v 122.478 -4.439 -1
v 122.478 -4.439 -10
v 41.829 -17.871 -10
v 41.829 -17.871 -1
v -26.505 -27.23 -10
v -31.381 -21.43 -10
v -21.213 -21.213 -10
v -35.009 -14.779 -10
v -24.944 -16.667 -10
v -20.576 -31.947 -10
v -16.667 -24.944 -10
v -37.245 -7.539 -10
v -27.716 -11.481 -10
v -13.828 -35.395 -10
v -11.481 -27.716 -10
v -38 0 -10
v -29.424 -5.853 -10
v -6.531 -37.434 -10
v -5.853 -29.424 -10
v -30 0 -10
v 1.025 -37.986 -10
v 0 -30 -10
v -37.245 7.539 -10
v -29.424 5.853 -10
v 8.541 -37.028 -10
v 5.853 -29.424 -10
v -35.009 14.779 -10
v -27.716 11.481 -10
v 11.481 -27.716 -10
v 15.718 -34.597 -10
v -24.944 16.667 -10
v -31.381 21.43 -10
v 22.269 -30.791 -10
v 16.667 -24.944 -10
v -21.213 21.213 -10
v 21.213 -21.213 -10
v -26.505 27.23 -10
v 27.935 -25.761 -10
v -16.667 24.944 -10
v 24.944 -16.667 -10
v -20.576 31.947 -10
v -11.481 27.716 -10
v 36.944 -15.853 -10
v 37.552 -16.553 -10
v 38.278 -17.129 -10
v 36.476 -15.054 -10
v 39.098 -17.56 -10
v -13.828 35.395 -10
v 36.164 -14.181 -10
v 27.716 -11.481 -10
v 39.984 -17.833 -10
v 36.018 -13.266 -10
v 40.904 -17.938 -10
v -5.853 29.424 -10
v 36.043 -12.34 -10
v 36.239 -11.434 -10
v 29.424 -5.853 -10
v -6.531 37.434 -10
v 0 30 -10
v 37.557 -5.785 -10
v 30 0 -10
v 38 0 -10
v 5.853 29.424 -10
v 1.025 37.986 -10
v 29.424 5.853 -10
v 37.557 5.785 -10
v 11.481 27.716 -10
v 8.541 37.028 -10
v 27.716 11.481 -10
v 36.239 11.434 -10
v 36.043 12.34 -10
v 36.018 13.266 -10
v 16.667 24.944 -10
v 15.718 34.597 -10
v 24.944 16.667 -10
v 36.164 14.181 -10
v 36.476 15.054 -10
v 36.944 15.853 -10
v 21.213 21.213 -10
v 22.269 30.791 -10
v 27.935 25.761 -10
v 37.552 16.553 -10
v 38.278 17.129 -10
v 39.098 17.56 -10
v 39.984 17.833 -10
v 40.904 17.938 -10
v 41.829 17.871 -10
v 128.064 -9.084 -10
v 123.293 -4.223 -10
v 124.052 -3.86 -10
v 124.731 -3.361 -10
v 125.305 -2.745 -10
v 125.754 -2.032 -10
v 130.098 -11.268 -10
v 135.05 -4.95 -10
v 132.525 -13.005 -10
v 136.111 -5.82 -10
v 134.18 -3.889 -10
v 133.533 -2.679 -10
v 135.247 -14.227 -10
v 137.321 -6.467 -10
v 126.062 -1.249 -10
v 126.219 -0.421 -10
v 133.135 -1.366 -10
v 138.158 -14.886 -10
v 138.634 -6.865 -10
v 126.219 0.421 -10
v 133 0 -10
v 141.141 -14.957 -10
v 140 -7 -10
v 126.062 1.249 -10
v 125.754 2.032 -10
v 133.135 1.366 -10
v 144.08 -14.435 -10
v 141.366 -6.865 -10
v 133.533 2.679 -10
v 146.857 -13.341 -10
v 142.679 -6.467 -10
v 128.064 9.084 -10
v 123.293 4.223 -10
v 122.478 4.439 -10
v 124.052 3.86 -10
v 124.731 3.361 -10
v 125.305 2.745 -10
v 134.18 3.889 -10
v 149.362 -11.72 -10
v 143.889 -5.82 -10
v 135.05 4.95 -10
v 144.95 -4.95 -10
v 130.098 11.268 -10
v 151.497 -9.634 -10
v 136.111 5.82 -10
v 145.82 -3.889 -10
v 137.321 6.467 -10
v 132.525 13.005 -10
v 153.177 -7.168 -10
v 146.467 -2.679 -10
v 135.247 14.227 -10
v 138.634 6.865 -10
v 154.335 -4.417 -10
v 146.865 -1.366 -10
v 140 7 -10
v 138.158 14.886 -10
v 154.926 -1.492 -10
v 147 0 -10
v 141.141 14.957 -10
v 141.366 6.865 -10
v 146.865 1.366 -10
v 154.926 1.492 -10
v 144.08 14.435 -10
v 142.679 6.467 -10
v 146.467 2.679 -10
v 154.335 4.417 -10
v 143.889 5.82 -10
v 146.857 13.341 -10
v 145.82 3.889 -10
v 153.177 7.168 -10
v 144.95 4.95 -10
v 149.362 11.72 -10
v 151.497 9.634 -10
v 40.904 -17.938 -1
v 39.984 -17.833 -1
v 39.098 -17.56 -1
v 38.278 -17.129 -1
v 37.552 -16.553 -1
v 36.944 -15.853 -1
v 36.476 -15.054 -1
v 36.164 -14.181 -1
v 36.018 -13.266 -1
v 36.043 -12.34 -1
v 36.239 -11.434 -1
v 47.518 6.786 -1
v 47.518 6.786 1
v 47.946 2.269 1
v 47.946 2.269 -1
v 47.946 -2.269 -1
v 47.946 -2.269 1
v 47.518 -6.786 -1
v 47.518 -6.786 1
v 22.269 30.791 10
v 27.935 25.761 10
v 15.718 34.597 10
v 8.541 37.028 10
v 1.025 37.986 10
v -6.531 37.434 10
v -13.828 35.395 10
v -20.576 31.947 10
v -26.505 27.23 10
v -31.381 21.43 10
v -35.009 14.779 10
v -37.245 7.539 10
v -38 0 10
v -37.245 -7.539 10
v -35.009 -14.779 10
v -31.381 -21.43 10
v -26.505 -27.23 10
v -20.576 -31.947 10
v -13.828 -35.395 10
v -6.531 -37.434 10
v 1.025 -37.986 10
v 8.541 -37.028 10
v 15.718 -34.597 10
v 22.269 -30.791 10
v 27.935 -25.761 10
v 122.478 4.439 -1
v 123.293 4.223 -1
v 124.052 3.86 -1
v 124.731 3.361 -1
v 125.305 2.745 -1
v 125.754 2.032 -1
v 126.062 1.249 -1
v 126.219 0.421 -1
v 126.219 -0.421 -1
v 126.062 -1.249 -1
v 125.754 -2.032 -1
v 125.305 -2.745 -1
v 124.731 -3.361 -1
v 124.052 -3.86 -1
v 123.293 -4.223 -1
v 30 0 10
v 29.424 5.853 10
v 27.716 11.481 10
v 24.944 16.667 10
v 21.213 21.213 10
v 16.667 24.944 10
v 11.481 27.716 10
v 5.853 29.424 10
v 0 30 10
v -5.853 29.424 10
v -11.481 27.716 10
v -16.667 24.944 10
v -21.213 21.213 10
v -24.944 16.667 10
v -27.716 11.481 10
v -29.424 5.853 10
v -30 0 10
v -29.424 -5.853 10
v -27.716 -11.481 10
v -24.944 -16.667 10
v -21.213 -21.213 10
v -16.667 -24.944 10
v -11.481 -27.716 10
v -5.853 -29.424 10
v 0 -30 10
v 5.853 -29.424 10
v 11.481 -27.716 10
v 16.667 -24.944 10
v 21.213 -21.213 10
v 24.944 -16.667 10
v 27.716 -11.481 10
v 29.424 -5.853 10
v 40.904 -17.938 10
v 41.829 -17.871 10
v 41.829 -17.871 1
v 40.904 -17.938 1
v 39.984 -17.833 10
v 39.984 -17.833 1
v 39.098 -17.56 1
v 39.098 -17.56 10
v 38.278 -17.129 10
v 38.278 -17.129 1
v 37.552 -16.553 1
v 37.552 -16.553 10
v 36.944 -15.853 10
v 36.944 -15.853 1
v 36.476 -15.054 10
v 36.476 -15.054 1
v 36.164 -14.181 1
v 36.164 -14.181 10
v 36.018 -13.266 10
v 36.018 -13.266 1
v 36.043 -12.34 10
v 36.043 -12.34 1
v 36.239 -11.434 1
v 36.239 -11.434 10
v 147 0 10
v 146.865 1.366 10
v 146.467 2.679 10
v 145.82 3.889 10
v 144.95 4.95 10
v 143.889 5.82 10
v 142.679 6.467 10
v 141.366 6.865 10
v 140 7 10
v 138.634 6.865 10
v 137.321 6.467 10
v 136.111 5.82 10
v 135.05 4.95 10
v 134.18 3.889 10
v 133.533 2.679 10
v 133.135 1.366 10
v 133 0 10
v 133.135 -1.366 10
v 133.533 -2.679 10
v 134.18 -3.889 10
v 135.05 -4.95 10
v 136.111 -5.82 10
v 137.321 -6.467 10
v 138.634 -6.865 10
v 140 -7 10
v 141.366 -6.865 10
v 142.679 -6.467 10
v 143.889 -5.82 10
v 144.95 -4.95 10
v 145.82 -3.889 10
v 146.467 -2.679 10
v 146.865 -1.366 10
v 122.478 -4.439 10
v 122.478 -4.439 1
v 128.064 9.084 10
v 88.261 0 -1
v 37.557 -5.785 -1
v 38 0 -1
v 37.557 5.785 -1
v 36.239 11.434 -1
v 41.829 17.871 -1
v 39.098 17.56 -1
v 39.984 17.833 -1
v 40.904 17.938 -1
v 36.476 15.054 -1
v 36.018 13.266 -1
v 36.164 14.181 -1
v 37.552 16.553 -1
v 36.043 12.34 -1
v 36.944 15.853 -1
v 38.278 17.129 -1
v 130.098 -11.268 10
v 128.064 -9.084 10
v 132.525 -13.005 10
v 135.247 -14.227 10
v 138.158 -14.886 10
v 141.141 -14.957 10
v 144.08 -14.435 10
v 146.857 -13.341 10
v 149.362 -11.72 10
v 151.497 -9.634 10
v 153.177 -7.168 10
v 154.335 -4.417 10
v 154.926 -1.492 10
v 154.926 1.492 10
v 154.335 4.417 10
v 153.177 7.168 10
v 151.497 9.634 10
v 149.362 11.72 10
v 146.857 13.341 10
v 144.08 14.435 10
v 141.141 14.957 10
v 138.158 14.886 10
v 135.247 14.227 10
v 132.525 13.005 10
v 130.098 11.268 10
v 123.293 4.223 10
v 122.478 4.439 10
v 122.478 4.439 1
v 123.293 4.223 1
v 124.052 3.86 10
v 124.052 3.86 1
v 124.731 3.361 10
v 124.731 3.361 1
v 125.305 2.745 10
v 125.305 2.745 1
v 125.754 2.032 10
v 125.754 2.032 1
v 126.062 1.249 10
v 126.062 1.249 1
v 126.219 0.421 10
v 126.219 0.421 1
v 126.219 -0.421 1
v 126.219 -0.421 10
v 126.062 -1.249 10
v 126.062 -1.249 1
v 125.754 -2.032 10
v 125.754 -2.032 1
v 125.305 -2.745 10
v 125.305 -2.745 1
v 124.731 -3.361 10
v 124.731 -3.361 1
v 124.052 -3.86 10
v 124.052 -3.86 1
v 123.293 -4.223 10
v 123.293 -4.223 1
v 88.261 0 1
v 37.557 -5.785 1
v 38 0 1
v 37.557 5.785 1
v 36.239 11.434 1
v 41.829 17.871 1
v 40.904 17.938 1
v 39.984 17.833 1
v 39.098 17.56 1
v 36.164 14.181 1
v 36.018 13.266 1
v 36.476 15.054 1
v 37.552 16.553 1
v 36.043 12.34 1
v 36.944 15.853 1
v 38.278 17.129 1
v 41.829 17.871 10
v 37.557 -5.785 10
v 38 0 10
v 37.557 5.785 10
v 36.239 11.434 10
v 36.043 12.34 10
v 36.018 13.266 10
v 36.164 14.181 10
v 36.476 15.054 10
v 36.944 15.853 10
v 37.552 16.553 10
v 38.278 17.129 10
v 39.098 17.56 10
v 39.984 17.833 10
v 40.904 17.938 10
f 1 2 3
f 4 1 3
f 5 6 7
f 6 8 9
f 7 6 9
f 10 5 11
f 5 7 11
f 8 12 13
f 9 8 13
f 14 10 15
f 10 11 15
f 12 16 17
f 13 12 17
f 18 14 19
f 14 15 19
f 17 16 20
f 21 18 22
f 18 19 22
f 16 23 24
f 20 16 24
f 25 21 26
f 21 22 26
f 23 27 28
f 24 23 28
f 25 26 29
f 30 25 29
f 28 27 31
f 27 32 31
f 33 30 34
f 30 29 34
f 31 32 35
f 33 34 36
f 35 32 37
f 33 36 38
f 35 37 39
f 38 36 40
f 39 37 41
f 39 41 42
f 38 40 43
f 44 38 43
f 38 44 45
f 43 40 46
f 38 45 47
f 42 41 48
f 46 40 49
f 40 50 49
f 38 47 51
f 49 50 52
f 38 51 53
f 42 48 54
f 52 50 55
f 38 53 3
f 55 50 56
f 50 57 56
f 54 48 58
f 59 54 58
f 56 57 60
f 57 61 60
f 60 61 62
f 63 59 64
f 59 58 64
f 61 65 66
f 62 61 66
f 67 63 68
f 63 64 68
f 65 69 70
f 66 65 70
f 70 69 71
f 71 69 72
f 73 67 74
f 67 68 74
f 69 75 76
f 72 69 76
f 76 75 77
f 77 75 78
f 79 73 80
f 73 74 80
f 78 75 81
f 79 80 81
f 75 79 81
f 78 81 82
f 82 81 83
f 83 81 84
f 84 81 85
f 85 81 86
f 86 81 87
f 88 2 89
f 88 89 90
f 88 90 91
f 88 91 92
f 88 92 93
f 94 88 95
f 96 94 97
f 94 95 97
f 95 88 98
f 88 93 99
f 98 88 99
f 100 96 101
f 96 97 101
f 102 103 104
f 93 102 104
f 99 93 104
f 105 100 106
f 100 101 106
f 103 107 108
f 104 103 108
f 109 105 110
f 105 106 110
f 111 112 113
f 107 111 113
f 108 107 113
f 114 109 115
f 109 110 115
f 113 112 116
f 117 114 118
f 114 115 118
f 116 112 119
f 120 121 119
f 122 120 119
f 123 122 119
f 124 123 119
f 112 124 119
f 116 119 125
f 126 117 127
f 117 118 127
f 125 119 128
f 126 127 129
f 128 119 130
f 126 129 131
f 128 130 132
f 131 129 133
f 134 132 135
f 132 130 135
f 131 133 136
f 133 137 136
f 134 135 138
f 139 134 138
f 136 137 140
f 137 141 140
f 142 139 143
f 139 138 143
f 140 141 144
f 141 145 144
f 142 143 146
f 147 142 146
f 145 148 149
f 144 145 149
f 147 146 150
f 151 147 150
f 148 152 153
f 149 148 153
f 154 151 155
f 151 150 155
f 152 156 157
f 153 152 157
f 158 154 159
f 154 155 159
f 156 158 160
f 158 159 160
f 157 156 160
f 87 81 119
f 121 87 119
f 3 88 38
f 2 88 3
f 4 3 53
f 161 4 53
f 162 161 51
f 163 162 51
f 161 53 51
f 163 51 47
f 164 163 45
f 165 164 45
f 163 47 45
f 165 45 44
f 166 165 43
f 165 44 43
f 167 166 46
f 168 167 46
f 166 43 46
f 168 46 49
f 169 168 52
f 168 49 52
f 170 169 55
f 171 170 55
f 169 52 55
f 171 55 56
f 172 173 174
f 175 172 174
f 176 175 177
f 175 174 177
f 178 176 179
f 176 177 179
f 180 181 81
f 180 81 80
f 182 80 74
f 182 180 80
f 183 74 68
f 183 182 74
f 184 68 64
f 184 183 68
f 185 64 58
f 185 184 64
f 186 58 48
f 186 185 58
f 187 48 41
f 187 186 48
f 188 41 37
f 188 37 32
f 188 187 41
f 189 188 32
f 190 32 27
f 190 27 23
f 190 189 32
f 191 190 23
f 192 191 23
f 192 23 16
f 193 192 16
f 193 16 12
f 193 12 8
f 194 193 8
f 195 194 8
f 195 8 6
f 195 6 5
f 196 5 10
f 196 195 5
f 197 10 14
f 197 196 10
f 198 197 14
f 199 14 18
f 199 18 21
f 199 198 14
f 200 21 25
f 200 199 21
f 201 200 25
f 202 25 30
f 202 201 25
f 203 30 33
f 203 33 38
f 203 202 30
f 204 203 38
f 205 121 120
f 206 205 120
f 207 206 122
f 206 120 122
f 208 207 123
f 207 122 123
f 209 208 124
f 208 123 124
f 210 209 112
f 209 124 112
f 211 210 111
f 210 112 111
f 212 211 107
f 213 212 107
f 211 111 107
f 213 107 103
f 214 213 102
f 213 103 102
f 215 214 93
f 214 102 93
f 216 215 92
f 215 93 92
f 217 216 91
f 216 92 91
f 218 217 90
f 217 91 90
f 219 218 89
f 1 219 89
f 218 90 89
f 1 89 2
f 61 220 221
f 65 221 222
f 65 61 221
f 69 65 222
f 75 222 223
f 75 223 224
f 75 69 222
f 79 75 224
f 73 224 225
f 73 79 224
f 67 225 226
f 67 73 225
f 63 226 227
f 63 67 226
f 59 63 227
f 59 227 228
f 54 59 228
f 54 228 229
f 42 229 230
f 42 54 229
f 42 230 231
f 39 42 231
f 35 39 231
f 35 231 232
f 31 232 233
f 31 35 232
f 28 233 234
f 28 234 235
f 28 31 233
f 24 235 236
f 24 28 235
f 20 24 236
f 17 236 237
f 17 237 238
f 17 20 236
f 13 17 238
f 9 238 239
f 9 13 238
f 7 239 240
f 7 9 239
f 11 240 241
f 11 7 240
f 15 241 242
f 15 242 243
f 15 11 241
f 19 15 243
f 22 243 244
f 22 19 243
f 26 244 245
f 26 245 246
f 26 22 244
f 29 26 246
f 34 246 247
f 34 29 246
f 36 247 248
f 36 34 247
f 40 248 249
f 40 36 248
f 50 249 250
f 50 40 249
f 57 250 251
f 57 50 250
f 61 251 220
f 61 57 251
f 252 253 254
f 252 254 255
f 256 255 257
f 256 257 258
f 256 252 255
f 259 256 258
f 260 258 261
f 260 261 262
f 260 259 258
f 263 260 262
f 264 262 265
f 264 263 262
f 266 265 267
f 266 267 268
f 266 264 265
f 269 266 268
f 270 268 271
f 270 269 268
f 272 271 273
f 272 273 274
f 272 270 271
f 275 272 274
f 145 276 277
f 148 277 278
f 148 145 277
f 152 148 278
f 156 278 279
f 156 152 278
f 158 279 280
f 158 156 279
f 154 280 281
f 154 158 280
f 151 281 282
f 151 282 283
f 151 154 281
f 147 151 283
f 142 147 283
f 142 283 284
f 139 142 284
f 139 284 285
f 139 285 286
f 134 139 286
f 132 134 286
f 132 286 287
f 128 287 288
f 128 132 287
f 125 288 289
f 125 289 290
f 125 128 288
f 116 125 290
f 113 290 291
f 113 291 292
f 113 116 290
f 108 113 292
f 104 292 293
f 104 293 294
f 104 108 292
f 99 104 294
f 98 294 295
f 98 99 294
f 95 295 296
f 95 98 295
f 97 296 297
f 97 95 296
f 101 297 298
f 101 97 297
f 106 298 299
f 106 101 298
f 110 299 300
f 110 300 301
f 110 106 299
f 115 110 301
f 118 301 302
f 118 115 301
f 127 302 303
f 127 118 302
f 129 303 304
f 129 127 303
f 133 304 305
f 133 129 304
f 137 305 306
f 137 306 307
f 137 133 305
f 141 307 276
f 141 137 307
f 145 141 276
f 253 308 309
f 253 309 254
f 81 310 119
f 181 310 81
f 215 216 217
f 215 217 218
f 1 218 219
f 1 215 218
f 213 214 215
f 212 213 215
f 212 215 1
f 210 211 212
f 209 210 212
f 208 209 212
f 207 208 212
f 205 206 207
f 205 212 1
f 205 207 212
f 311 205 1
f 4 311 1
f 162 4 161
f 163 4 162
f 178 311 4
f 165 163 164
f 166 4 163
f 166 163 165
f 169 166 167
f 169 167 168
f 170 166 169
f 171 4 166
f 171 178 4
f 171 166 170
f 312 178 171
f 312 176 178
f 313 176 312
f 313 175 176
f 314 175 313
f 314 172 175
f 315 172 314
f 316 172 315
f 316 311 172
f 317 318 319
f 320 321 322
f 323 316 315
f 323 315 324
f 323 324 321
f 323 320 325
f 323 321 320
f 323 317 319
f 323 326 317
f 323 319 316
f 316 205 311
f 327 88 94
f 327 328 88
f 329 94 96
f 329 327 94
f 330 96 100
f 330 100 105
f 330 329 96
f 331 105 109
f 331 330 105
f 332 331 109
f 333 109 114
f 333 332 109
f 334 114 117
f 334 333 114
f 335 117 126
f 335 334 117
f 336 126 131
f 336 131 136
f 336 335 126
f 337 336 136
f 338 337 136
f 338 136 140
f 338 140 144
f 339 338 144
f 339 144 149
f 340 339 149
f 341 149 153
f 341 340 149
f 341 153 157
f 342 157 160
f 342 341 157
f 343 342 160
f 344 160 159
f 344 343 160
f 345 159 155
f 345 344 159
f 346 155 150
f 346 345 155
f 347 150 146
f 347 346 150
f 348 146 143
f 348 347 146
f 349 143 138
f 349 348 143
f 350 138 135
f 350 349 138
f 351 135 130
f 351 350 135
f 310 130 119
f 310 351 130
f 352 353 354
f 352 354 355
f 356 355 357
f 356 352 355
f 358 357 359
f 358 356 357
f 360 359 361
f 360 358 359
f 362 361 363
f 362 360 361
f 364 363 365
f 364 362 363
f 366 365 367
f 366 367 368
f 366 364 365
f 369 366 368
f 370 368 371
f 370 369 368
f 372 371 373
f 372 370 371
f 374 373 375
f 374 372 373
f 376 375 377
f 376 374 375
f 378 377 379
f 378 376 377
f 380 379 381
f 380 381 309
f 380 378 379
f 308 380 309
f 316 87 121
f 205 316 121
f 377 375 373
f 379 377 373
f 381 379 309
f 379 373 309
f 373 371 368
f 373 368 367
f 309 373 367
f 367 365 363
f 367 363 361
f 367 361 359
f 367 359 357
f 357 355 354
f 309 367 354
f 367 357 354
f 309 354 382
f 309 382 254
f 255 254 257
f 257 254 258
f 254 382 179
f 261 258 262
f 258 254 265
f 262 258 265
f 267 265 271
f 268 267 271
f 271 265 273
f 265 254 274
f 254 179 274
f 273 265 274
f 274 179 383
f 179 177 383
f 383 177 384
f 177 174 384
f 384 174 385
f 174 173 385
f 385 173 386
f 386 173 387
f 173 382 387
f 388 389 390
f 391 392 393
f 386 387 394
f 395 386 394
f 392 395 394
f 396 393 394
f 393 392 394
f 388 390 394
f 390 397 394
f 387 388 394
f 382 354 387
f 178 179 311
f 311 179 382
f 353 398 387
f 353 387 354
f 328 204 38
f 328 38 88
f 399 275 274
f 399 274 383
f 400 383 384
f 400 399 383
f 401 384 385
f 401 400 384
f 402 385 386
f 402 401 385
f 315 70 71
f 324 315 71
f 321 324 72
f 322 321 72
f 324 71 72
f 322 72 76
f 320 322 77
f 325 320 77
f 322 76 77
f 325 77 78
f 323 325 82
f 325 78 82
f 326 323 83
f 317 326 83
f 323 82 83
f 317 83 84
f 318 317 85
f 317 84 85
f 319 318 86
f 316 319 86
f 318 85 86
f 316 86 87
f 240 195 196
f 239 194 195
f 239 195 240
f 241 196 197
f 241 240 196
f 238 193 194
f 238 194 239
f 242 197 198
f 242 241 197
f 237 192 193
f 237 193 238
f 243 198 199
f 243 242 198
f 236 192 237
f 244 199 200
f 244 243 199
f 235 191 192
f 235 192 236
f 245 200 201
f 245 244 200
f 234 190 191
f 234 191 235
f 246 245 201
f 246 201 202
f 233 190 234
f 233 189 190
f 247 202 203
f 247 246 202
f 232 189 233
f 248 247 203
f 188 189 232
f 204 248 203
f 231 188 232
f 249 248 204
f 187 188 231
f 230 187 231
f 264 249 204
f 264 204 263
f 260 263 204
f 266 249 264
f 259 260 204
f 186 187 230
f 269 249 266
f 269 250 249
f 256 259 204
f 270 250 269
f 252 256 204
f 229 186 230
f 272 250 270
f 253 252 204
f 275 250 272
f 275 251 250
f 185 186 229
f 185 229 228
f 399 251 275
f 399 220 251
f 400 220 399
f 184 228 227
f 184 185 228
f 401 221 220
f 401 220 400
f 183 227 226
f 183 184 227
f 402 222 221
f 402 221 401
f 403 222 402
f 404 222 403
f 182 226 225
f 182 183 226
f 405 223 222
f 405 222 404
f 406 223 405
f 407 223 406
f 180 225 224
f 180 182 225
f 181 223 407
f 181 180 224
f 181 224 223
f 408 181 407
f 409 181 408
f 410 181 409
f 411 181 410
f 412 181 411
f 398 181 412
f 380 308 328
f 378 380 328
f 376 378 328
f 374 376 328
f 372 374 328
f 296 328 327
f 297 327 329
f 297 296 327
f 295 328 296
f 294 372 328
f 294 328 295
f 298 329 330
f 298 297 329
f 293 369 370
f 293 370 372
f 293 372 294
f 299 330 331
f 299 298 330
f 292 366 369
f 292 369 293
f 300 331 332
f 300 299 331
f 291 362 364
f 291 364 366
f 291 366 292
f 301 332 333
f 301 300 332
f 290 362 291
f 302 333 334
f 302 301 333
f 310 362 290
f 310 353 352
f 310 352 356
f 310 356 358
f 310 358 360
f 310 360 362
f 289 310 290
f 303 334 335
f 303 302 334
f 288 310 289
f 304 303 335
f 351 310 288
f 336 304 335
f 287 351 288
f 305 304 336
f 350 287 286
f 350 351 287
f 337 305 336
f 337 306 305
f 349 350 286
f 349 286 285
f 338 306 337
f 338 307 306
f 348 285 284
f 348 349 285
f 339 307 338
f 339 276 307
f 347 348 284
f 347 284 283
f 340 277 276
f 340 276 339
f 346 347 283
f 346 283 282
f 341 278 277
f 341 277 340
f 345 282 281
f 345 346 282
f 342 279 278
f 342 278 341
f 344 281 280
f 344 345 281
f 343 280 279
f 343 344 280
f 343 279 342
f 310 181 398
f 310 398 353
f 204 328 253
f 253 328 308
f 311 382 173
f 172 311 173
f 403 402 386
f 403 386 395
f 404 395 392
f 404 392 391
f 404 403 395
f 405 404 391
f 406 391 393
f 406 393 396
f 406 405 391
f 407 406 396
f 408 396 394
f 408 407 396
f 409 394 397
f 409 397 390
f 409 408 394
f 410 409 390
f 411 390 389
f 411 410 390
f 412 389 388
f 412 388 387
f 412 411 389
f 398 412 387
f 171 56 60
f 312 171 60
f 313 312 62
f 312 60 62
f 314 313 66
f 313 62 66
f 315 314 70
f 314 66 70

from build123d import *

# Parameters (mm, degrees)
SKETCH1_R           = 30
SKETCH1_R_2         = 7
BOSS_EXTRUDE1_DEPTH = 10
CUT_EXTRUDE1_DEPTH  = 9
CUT_EXTRUDE2_DEPTH  = 12


with BuildPart() as part:
    # Sketch1 → Boss-Extrude1 (new body, symmetric)
    with BuildSketch(Plane.XY):
        with BuildLine():
            Line((128.063755469, 9.084385863), (27.935473676, 25.760615491))
            ThreePointArc((27.935473676, 25.760615491), (-38, 0), (27.935473676, -25.760615491))
            Line((27.935473676, -25.760615491), (128.063755469, -9.084385863))
            ThreePointArc((128.063755469, -9.084385863), (155, 0), (128.063755469, 9.084385863))
        make_face()
        Circle(SKETCH1_R, mode=Mode.SUBTRACT)
        with Locations((140, 0)):
            Circle(SKETCH1_R_2, mode=Mode.SUBTRACT)
    extrude(amount=BOSS_EXTRUDE1_DEPTH, both=True)

    # Sketch2 → Cut-Extrude1 (cut)
    with BuildSketch(Plane.XY.offset(10)):
        with BuildLine():
            Line((41.828554558, 17.870982725), (122.478416149, 4.438857582))
            ThreePointArc((122.478416149, 4.438857582), (126.239130435, 0), (122.478416149, -4.438857582))
            Line((122.478416149, -4.438857582), (41.828554558, -17.870982725))
            ThreePointArc((41.828554558, -17.870982725), (37.231968897, -16.217361812), (36.238855523, -11.43439331))
            ThreePointArc((36.238855523, -11.43439331), (38, 0), (36.238855523, 11.43439331))
            ThreePointArc((36.238855523, 11.43439331), (37.231968897, 16.217361812), (41.828554558, 17.870982725))
        make_face()
    cut_extrude1 = extrude(amount=-CUT_EXTRUDE1_DEPTH, mode=Mode.SUBTRACT)

    # Mirror1: Cut-Extrude1 across plane
    add(cut_extrude1.mirror(Plane.XY), mode=Mode.SUBTRACT)

    # Sketch3 → Cut-Extrude2 (cut, through all)
    with BuildSketch(Plane.XY.offset(1)):
        with BuildLine():
            Line((47.517939236, -6.785679827), (88.260869565, 0))
            Line((88.260869565, 0), (47.517939236, 6.785679827))
            ThreePointArc((47.517939236, 6.785679827), (48, 0), (47.517939236, -6.785679827))
        make_face()
    extrude(amount=-CUT_EXTRUDE2_DEPTH, mode=Mode.SUBTRACT)


solid = part.part
